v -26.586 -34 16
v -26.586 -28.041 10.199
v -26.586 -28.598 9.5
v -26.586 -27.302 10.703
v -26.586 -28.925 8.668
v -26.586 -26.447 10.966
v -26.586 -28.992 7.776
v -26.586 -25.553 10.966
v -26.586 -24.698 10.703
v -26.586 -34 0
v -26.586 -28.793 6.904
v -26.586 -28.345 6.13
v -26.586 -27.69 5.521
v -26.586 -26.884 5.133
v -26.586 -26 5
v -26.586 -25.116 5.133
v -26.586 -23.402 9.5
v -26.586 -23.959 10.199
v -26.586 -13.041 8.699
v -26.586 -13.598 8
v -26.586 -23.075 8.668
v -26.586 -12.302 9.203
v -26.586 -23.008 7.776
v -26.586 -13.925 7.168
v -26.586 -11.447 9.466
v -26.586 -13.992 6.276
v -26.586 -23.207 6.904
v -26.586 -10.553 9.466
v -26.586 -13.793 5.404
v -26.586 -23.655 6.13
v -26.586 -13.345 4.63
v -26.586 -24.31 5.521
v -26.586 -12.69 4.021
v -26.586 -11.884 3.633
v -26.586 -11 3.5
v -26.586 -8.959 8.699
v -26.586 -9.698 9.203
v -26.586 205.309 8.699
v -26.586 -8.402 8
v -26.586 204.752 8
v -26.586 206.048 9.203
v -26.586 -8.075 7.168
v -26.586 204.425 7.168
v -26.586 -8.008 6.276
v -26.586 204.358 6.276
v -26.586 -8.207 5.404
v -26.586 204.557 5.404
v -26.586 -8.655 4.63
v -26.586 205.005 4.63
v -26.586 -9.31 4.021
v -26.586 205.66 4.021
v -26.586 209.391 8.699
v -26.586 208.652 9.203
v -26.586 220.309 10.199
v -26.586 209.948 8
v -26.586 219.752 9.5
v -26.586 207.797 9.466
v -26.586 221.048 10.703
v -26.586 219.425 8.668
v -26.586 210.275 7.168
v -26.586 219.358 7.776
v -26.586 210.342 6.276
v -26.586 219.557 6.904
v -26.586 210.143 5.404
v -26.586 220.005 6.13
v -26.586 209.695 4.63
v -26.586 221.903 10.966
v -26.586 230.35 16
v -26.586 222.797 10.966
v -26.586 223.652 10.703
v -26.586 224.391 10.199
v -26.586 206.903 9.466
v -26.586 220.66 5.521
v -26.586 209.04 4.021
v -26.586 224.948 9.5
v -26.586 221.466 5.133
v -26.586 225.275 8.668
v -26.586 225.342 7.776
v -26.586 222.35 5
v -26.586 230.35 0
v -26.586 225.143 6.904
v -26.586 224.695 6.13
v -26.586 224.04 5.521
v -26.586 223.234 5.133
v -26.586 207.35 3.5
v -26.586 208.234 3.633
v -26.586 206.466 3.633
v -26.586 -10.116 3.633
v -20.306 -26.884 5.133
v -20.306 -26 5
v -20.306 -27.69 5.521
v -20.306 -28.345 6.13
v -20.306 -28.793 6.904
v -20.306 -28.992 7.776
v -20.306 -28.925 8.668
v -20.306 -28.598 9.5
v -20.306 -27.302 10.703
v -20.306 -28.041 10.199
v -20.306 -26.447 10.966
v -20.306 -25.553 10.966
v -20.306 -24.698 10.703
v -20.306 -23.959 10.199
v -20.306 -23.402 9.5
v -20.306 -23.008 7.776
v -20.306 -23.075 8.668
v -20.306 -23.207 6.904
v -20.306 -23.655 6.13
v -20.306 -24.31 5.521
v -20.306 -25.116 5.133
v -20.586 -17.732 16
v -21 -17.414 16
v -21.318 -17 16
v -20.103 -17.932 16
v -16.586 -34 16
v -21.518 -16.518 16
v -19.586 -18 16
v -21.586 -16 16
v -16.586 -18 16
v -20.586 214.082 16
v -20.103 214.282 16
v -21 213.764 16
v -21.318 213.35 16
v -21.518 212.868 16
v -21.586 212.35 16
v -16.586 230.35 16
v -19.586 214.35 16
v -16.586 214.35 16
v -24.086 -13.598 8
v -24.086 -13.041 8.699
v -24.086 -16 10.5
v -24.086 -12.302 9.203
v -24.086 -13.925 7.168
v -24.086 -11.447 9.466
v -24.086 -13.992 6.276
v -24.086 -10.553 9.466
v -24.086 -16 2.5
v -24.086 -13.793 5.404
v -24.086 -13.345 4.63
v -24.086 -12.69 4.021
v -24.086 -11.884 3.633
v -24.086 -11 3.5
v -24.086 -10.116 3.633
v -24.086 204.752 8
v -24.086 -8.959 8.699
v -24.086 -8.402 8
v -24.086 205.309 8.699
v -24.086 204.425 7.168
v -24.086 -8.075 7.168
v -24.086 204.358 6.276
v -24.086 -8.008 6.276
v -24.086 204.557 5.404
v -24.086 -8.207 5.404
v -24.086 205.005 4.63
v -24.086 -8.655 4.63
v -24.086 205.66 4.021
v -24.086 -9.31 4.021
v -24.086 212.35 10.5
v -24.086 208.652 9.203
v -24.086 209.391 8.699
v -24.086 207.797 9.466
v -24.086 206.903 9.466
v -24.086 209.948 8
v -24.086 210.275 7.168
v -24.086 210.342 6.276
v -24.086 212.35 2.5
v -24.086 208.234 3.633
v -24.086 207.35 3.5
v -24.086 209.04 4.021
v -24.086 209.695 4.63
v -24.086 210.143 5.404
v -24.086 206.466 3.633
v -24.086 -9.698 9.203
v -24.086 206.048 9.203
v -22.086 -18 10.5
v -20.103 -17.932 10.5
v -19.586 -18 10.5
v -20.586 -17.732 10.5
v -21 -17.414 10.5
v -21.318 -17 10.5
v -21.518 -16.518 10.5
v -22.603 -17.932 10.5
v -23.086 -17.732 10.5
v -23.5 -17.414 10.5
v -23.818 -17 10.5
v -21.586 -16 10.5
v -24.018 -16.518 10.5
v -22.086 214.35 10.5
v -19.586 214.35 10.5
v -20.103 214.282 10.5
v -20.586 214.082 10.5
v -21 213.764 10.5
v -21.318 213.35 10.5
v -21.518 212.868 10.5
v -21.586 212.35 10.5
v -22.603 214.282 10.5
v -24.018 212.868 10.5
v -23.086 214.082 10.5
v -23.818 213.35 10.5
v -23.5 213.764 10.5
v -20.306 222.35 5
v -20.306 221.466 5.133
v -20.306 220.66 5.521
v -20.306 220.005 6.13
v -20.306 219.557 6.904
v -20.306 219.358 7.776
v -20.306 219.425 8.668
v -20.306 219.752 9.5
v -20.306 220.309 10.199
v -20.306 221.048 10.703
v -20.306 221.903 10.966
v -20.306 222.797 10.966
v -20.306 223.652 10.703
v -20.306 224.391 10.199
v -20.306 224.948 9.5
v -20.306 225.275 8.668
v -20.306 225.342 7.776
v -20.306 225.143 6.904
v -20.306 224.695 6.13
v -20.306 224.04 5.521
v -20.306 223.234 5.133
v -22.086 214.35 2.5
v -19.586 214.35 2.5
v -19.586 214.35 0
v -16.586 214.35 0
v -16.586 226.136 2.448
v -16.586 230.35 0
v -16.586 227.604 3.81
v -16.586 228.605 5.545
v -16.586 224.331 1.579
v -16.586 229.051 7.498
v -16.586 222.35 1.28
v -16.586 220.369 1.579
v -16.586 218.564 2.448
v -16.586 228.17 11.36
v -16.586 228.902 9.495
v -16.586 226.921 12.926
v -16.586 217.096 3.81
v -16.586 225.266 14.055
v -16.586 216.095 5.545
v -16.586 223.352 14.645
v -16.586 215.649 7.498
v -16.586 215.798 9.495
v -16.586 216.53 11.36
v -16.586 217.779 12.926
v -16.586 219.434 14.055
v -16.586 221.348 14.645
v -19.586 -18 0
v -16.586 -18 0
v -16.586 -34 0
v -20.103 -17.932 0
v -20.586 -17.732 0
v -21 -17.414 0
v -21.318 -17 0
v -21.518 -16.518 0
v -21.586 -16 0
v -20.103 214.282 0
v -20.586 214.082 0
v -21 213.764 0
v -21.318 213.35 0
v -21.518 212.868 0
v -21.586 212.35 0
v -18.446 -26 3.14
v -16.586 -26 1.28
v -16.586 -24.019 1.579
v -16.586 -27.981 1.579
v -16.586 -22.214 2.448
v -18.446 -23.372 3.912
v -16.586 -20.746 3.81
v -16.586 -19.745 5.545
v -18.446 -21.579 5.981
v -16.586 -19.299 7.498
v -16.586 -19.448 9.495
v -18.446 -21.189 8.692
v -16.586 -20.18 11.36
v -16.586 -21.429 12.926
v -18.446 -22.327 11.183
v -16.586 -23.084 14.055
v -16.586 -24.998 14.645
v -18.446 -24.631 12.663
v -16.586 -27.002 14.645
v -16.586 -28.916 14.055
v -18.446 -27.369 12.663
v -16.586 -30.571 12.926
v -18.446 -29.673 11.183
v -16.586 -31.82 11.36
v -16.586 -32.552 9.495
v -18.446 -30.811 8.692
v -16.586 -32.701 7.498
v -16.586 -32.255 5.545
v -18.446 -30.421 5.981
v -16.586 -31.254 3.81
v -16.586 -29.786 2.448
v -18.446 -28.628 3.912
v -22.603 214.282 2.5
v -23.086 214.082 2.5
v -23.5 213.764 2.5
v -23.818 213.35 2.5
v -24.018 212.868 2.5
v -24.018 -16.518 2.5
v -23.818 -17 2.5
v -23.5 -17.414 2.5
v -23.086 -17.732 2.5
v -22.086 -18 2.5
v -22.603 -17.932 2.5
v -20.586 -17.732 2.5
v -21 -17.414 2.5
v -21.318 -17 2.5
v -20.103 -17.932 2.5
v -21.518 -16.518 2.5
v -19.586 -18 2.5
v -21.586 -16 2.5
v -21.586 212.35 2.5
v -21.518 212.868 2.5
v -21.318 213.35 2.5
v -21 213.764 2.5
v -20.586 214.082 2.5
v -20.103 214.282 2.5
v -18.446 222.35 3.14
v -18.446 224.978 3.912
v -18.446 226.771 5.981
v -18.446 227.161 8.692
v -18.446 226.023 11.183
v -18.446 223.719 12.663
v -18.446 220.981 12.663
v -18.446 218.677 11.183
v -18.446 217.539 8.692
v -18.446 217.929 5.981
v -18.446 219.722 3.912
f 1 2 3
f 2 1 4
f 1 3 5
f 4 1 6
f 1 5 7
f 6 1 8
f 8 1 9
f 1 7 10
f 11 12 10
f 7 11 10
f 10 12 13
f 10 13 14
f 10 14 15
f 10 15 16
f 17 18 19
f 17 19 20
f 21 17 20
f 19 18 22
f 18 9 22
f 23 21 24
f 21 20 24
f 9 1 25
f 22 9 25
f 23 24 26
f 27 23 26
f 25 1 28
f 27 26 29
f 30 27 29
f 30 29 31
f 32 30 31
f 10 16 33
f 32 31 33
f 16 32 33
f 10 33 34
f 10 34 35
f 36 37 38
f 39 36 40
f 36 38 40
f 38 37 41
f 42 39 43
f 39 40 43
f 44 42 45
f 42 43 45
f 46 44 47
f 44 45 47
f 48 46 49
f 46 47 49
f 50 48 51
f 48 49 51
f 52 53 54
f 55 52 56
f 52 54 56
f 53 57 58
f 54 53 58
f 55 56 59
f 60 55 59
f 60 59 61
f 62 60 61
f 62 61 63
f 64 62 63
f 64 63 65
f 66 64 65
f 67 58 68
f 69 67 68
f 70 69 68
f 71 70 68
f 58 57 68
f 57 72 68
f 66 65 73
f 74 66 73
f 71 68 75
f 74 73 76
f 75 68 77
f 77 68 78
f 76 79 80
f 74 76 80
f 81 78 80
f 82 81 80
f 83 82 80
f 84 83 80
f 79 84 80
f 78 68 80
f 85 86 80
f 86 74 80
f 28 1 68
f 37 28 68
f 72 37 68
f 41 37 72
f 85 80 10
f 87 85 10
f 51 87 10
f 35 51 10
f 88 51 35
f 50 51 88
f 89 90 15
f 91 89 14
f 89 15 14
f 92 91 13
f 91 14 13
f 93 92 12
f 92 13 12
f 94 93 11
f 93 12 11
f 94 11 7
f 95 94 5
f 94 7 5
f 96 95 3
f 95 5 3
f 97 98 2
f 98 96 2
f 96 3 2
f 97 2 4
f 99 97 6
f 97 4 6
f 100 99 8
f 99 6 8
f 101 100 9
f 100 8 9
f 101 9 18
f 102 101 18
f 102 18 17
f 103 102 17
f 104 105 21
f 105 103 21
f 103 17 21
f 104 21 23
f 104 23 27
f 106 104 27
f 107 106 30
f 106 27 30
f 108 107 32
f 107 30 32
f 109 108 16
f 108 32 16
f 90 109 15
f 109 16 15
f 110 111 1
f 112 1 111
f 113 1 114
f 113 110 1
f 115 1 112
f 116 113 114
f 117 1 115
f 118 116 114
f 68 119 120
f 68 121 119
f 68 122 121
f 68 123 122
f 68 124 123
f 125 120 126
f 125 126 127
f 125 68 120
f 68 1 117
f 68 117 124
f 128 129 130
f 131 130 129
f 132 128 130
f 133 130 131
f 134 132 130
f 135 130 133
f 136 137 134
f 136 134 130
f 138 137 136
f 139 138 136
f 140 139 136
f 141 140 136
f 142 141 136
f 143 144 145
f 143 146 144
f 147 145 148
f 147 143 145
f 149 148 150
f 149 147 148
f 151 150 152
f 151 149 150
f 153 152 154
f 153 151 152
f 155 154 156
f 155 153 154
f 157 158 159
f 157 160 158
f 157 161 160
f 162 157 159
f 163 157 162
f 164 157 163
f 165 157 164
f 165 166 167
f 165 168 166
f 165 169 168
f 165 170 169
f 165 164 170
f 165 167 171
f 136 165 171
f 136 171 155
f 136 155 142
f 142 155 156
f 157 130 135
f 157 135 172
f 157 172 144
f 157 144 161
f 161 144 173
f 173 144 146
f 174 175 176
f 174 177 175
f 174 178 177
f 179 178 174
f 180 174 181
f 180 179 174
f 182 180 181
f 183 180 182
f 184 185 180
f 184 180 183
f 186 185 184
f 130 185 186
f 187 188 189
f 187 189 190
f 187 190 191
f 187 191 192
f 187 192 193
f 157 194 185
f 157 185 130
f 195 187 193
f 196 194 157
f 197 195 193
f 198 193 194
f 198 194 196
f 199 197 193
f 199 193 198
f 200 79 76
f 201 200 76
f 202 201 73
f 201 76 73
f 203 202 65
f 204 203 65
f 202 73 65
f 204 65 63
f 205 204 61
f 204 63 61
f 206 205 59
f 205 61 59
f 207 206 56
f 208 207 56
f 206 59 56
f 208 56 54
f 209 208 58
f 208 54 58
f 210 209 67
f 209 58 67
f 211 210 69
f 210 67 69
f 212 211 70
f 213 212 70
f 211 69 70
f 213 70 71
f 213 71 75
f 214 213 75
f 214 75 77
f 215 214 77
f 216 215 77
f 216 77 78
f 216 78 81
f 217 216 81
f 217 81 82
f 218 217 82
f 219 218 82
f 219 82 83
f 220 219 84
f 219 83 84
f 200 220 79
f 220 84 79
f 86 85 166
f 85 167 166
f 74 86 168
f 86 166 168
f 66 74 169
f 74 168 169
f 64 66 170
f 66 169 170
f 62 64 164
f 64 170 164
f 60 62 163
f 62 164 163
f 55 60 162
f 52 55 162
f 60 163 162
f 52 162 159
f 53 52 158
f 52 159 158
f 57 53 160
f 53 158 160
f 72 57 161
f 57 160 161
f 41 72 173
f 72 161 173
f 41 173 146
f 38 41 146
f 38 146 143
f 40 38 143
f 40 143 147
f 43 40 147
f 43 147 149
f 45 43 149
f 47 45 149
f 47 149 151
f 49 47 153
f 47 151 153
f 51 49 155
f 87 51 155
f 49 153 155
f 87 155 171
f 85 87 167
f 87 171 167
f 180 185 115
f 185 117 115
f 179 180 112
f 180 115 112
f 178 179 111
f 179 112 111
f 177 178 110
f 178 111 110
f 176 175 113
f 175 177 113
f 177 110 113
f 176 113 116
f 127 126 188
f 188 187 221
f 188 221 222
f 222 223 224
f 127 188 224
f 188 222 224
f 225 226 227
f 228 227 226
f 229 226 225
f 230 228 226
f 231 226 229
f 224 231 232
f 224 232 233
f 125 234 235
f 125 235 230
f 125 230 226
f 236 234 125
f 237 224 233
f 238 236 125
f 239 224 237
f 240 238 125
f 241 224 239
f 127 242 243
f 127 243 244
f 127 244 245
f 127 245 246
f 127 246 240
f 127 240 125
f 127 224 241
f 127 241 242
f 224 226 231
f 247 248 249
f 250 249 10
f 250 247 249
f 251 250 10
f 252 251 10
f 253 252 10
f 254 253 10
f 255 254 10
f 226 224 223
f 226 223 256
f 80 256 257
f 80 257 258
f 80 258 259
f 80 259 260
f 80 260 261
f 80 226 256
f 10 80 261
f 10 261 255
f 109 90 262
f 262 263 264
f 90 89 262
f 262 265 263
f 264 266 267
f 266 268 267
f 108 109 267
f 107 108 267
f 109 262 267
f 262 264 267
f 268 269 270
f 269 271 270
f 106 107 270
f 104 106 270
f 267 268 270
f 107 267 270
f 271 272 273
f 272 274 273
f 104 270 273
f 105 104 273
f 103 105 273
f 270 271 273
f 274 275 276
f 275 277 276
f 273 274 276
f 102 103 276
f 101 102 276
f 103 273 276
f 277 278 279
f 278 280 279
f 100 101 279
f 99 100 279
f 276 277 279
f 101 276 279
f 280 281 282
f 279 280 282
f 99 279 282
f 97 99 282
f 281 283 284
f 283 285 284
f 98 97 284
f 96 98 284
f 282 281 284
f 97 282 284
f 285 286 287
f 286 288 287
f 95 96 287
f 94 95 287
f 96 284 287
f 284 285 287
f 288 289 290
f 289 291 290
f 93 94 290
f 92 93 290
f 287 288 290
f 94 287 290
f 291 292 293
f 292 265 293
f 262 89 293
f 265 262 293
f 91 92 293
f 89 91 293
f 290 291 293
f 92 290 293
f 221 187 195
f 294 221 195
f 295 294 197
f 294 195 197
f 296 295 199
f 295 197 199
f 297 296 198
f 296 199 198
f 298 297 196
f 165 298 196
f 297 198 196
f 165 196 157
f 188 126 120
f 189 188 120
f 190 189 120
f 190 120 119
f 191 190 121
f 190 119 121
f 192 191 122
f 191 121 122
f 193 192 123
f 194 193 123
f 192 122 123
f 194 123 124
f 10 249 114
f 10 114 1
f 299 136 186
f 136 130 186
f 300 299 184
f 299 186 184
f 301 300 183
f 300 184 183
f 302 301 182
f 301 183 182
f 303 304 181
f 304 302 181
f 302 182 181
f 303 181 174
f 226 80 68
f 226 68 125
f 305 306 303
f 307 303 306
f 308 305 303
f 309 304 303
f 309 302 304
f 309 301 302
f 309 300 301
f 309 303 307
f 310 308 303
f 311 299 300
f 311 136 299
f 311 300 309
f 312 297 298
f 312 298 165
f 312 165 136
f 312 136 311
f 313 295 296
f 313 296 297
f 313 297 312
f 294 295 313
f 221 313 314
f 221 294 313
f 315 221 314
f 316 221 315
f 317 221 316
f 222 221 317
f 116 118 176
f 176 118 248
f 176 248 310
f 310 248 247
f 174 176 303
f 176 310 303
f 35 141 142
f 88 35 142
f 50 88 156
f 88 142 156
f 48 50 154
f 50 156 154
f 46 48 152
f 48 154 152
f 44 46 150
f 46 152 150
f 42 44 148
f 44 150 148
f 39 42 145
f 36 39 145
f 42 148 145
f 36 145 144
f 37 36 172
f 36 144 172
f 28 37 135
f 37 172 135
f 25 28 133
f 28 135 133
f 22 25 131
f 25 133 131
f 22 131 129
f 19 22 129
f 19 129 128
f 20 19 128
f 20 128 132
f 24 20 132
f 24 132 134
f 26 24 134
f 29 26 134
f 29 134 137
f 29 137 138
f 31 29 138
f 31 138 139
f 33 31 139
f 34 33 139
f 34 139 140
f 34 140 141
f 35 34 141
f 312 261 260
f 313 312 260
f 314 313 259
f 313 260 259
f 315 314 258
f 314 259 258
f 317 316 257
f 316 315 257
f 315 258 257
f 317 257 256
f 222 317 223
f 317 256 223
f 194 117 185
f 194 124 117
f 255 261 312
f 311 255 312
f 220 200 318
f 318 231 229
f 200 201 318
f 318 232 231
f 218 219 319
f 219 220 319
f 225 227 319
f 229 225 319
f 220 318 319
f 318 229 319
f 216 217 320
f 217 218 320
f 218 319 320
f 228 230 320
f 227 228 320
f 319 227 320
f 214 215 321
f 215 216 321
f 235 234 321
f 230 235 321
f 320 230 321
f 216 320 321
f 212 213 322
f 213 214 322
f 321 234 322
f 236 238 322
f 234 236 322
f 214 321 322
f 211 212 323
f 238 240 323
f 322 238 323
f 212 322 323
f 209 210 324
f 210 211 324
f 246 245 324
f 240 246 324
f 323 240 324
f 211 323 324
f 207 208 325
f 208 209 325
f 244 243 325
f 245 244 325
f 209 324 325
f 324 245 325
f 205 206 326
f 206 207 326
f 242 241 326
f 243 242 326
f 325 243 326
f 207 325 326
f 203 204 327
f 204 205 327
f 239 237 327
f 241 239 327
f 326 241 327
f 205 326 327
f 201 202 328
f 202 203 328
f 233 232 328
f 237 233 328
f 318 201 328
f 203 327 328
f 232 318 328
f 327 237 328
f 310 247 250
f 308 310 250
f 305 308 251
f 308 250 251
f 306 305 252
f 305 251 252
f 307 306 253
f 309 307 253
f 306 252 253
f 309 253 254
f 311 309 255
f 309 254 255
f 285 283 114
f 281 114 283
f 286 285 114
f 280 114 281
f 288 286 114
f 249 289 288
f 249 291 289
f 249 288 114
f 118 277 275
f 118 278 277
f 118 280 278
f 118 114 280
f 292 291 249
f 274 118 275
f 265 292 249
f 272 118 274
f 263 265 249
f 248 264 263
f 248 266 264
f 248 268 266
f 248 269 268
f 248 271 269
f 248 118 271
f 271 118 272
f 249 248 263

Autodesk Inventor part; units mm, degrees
ref_plane "YZ Plane" through (0, 0, 0) normal (1, 0, 0) x (0, 1, 0)
sketch "Sketch2" plane through (0, 0, 0) normal (0, 0, 1) x (1, 0, 0)
  line L0 (-32.0857, 0) -> (0, 0)
  line L1 (0, 0) -> (0, 19.635)
  line L2 (0, 19.635) -> (-32.0857, 19.635)
  spline S0 degree 3 poles (-32.0857, 19.635) (-32.0786, 19.6019) (-32.0585, 19.4984) (-32.0378, 19.3226) (-32.0222, 19.1083) (-32.0293, 18.8935) (-32.0484, 18.6795) (-32.102, 18.3981) (-32.1765, 18.0482) (-32.2416, 17.6965) (-32.2997, 17.416) (-32.364, 17.211) (-32.4396, 17.0099) (-32.536, 16.8179) (-32.6409, 16.6304) (-32.7641, 16.4543) (-32.8983, 16.2866) (-33.043, 16.1278) (-33.201, 15.9822) (-33.3669, 15.8459) (-33.5414, 15.7205) (-33.7857, 15.5713) (-34.1055, 15.4094) (-34.509, 15.2608) (-34.9249, 15.1525) (-35.3479, 15.078) (-35.7753, 15.0341) (-36.2047, 15.0215) (-36.6341, 15.0313) (-37.0623, 15.0646) (-37.3462, 15.1014) (-37.4881, 15.1198) knots -0.847201 -0.847201 -0.847201 -0.847201 -0.83705 -0.815587 -0.794126 -0.772659 -0.751201 -0.729734 -0.686802 -0.64387 -0.622403 -0.600945 -0.579478 -0.558017 -0.536554 -0.515088 -0.49363 -0.472163 -0.450698 -0.429238 -0.407769 -0.386302 -0.343394 -0.300476 -0.257562 -0.214646 -0.17172 -0.12879 -0.085861 -0.04293 0 0 0 0
  spline S1 degree 3 poles (-37.4881, 15.1198) (-37.594, 15.1249) (-37.8057, 15.1352) (-38.2295, 15.119) (-38.7575, 15.0717) (-39.3865, 14.9771) (-40.0103, 14.8535) (-40.6285, 14.7043) (-41.2408, 14.5326) (-41.847, 14.3405) (-42.4469, 14.1297) (-43.0405, 13.9015) (-43.6276, 13.6572) (-44.2081, 13.3977) (-44.782, 13.1239) (-45.3493, 12.8367) (-45.9097, 12.5363) (-46.4639, 12.2246) (-46.8275, 12.0066) (-47.0092, 11.8976) knots -1.017256 -1.017256 -1.017256 -1.017256 -0.985476 -0.953687 -0.890117 -0.826542 -0.762964 -0.699386 -0.635807 -0.572227 -0.508647 -0.445066 -0.381486 -0.317905 -0.254324 -0.190743 -0.127162 -0.063581 0 0 0 0
  arc A0 (-47.0092, 11.8976) -> (-47.0092, 7.7374) centre (9.2023, 9.8175) ccw
  spline S2 degree 3 poles (-47.0092, 7.7374) (-46.8275, 7.6284) (-46.4639, 7.4104) (-45.9097, 7.0987) (-45.3493, 6.7983) (-44.782, 6.5111) (-44.2081, 6.2373) (-43.6276, 5.9778) (-43.0405, 5.7335) (-42.4469, 5.5053) (-41.847, 5.2945) (-41.2408, 5.1024) (-40.6285, 4.9307) (-40.0103, 4.7815) (-39.3865, 4.6579) (-38.7575, 4.5633) (-38.2295, 4.516) (-37.8057, 4.4998) (-37.594, 4.5101) (-37.4881, 4.5152) knots -1.017256 -1.017256 -1.017256 -1.017256 -0.953675 -0.890094 -0.826513 -0.762932 -0.699351 -0.63577 -0.572189 -0.508609 -0.445029 -0.381449 -0.31787 -0.254291 -0.190714 -0.127139 -0.063568 -0.03178 0 0 0 0
  spline S3 degree 3 poles (-37.4881, 4.5152) (-37.3462, 4.5336) (-37.0623, 4.5704) (-36.6341, 4.6037) (-36.2047, 4.6135) (-35.7753, 4.6009) (-35.3479, 4.557) (-34.9249, 4.4825) (-34.509, 4.3742) (-34.1055, 4.2256) (-33.7857, 4.0637) (-33.5414, 3.9145) (-33.3669, 3.7891) (-33.201, 3.6528) (-33.043, 3.5072) (-32.8983, 3.3484) (-32.7641, 3.1807) (-32.6409, 3.0046) (-32.536, 2.8171) (-32.4396, 2.6251) (-32.364, 2.424) (-32.2997, 2.219) (-32.2416, 1.9385) (-32.1765, 1.5868) (-32.102, 1.2369) (-32.0484, 0.9555) (-32.0293, 0.7415) (-32.0222, 0.5267) (-32.0378, 0.3124) (-32.0585, 0.1366) (-32.0786, 0.0331) (-32.0857, 0) knots -1.373604 -1.373604 -1.373604 -1.373604 -1.330674 -1.287743 -1.244814 -1.201884 -1.158958 -1.116042 -1.073128 -1.03021 -0.987302 -0.965835 -0.944366 -0.922906 -0.901441 -0.879974 -0.858516 -0.83705 -0.815587 -0.794126 -0.772659 -0.751201 -0.729734 -0.686802 -0.64387 -0.622403 -0.600945 -0.579478 -0.558017 -0.536554 -0.526403 -0.526403 -0.526403 -0.526403
extrude "Extrusion1" add sketch "Sketch2" along normal blind 16
pattern_linear "Rectangular Pattern1" count 10 spacing 19.635 along (0, 1, 0) of "Extrusion1"
sketch "Sketch5" plane through (-32.0857, 0, 0) normal (0, -1, 0) x (1, 0, 0)
  line L0 (32.0857, 0) -> (32.0857, 16) projected
  line L1 (0, 16) -> (32.0857, 16) projected
  line L2 (0, 0) -> (32.0857, 0) projected
  line L3 (0, 0) -> (0, 16) projected
  line L4 (0, 16) -> (8, 16)
  line L5 (8, 16) -> (8, 0) construction
  line L6 (8, 0) -> (0, 0)
  line L7 (0, 0) -> (0, 16)
  line L8 (8, 16) -> (10.5, 16)
  line L9 (10.5, 16) -> (10.5, 10.5)
  line L10 (10.5, 10.5) -> (8, 10.5)
  line L11 (8, 10.5) -> (8, 16) construction
  line L12 (8, 2.5) -> (10.5, 2.5)
  line L13 (10.5, 2.5) -> (10.5, 0)
  line L14 (10.5, 0) -> (8, 0)
  line L15 (8, 0) -> (8, 2.5) construction
  line L16 (8, 9.5) -> (37, 9.5) construction
  line L17 (37, 9.5) -> (37, 3.5) construction
  line L18 (37, 3.5) -> (8, 3.5) construction
  line L19 (8, 3.5) -> (8, 9.5) construction
  line L20 (8, 10.5) -> (8, 2.5)
  line L21 (34.5, 15.5) -> (10.5, 15.5) construction
  line L22 (10.5, 15.5) -> (10.5, 0.5) construction
  line L23 (10.5, 0.5) -> (34.5, 0.5) construction
  line L24 (34.5, 0.5) -> (34.5, 15.5) construction
  line L25 (41.5759, 16) -> (41.5759, 15.5) construction
  line L26 (41.5759, 0.5) -> (41.5759, 0) construction
  line L27 (25.6, 16.05) -> (19.4, 16.05) construction
  line L28 (19.4, -0.05) -> (25.6, -0.05) construction
  line L29 (25.6, -0.05) -> (25.6, 0.5) construction
  line L30 (25.6, 15.5) -> (25.6, 16.05) construction
  line L31 (19.4, 16.05) -> (19.4, 15.5) construction
  line L32 (19.4, 0.5) -> (19.4, -0.05) construction
  line L33 (25.6, 0.5) -> (25.6, 15.5) construction
  line L34 (19.4, 15.5) -> (19.4, 0.5) construction
  point P0 (9.25, 10.5)
  point P1 (9.25, 2.5)
  point P2 (8, 6.5)
  point P3 (8, 6.5)
  point P4 (22.5, 15.5)
  point P5 (22.5, 9.5)
  point P6 (22.5, -0.05)
  dimension "d15" = 8
  dimension "d16" = 8
  dimension "d18" = 6
  dimension "d19" = 29
  dimension "d20" = 24
  dimension "d21" = 6
  dimension "d22" = 3
  dimension "d23" = 2.5
  dimension "d24" = 2.5
  dimension "d30" = 5.5
  dimension "d31" = 2.5
  dimension "d64" = 6.2
  dimension "d65" = 16.1
extrude "Extrusion3" cut sketch "Sketch5" against normal through all contours L2 L13 L12 L20 L10 L9 L1 L0
sketch "Measurements" plane through (0, 0, 0) normal (0, 0, -1) x (-1, 0, 0)
  line L0 (41.7977, 19.635) -> (70.5831, 19.635) construction
  line L1 (141.7977, 176.7146) -> (141.7977, 118.484) construction
  line L2 (21.5857, 196.35) -> (21.5857, 0) projected
  line L3 (32.0857, 0) -> (21.5857, 0) projected
  circle A0 centre (91.7977, 19.635) radius 50 construction
  line L4 (41.7977, -40.4843) -> (41.7977, 79.7543) construction
  line L5 (41.7977, 19.635) -> (141.7977, 19.635) construction
  line L6 (141.7977, 19.635) -> (141.7977, 176.7146) construction
  arc A1 (41.7977, 19.635) -> (141.7977, 176.7146) centre (-31.5724, 176.7146) ccw construction
  circle A2 centre (91.7977, 176.7146) radius 50 construction
  line L7 (-14.9143, 139.9646) -> (32.0857, 139.9646) construction
  line L8 (32.0857, 139.9646) -> (32.0857, 213.4646) construction
  line L9 (32.0857, 213.4646) -> (-14.9143, 213.4646) construction
  line L10 (-14.9143, 213.4646) -> (-14.9143, 139.9646) construction
  circle A3 centre (91.7977, 176.7146) radius 5 construction
  line L11 (32.0857, 139.9646) -> (96.4406, 164.572) construction
  arc A4 (96.4406, 164.572) -> (96.4406, 188.8572) centre (91.7977, 176.7146) ccw construction
  line L12 (96.4406, 188.8572) -> (32.0857, 213.4646) construction
  line L13 (-14.9143, -17.115) -> (32.0857, -17.115) construction
  line L14 (32.0857, -17.115) -> (32.0857, 56.385) construction
  line L15 (32.0857, 56.385) -> (-14.9143, 56.385) construction
  line L16 (-14.9143, 56.385) -> (-14.9143, -17.115) construction
  circle A5 centre (91.7977, 19.635) radius 5 construction
  line L17 (32.0857, -17.115) -> (96.4406, 7.4924) construction
  arc A6 (96.4406, 7.4924) -> (96.4406, 31.7776) centre (91.7977, 19.635) ccw construction
  line L18 (96.4406, 31.7776) -> (32.0857, 56.385) construction
  line L19 (96.7977, 176.7146) -> (96.7977, 157.197) construction
  line L20 (96.7977, 19.635) -> (96.7977, 0.1424) construction
  circle A7 centre (9.5857, 201.4646) radius 14.5 construction
  line L21 (-14.9143, 176.7146) -> (-21.6792, 176.7146)
  circle A8 centre (9.5857, 151.9646) radius 14.5 construction
  point P0 (0, 0)
  point P1 (32.0857, 176.7146)
  point P2 (104.7977, 176.7146)
  point P3 (104.7977, 19.635)
  point P4 (32.0857, 19.635)
  dimension "d43" = 10
  dimension "d32" = 100
  dimension "d33" = 157.0796
  dimension "d34" = 59.712
  dimension "d36" = 73.5
  dimension "d37" = 47
  dimension "d38" = 73.5
  dimension "d39" = 47
  dimension "d41" = 8
  dimension "d44" = 17.115
  dimension "d66" = 29
  dimension "d67" = 12
  dimension "d68" = 24.5
ref_plane "Midplane" through (-32.0857, 98.175, 0) normal (0, -1, 0) x (1, 0, 0)
sketch "Sketch10" plane through (-32.0857, 196.35, 16) normal (0, 1, 0) x (1, 0, 0)
  line L0 (0, 16) -> (0, 0) projected
  line L1 (10.5, 16) -> (0, 16) projected
  line L2 (0, 16) -> (10.5, 16)
  line L3 (10.5, 13.5) -> (10.5, 16)
  line L4 (10.5, 13.5) -> (8, 13.5) projected
  line L5 (8, 13.5) -> (10.5, 13.5)
  line L6 (8, 13.5) -> (8, 5.5) projected
  line L7 (8, 5.5) -> (8, 13.5)
  line L8 (8, 5.5) -> (10.5, 5.5) projected
  line L9 (10.5, 5.5) -> (8, 5.5)
  line L10 (10.5, 5.5) -> (10.5, 0)
  line L11 (10.5, 0) -> (0, 0)
  line L12 (0, 0) -> (0, 16)
  point P0 (32.0857, 16)
extrude "Extra" add sketch "Sketch10" along normal blind 18
sketch "Sketch11" plane through (-32.0857, 214.35, 16) normal (0, 1, 0) x (1, 0, 0)
  line L0 (0, 16) -> (15.5, 16)
  line L1 (15.5, 16) -> (15.5, 0)
  line L2 (15.5, 0) -> (0, 0)
  line L3 (0, 0) -> (0, 16)
  line L4 (0, 0) -> (10.5, 0) projected
  line L5 (10.5, 16) -> (0, 16) projected
  line L6 (10.5, 0) -> (10.5, 5.5) projected
  line L7 (0, 16) -> (0, 0) projected
  point P0 (32.0857, 16)
  dimension "d63" = 5
extrude "Bracket" add sketch "Sketch11" along normal blind 16
sketch "Sketch13" plane through (-16.5857, 214.35, 16) normal (1, 0, 0) x (0, 0, -1)
  circle A0 centre (8, 8) radius 5.865
  line L0 (16, 0) -> (16, 16) projected
  line L1 (0, 16) -> (16, 16) projected
  point P0 (16, -214.35)
  point P1 (16, 8)
  point P2 (8, 16)
  dimension "d69" = 11.73
hole "Hole1" at (-16.5857, 222.35, 8) direction (-1, 0, 0) diameter 6 end through all countersink diameter 13.44 countersink angle 90
fillet "Fillet2" radius 2 3 edges at (-21.5857, 214.35, 1.25) (-24.0857, 214.35, 6.5) (-21.5857, 214.35, 13.25)
mirror "Mirror3" about plane through (-32.0857, 98.175, 0) normal (0, -1, 0) of "Fillet2", "Hole1", "Bracket", "Extra"
ref_plane "Work Plane3" through (-26.5857, 212.35, 16) normal (1, 0, 0) x (0, 0, -1)
sketch "Sketch14" plane through (-26.5857, 212.35, 16) normal (1, 0, 0) x (0, 0, -1)
  line L0 (26.8583, 24.8606) -> (-9.9213, 24.8606)
  line L1 (-9.9213, 24.8606) -> (-9.9213, -261.2458)
  line L2 (-9.9213, -261.2458) -> (26.8583, -261.2458)
  line L3 (26.8583, -261.2458) -> (26.8583, 24.8606)
  point P0 (16, -212.35)
extrude "Extrusion7" cut sketch "Sketch14" against normal through all
sketch "Sketch15" plane through (-24.0857, 212.35, 10.5) normal (1, 0, 0) x (0, 0, -1)
  circle A0 centre (4, -223.35) radius 3
  line L0 (-47.7239, -114.175) -> (-79.2168, -114.175)
  line L1 (-32.3539, 18) -> (-32.3539, -246.35) construction
  circle A1 centre (4, -5) radius 3
  line L2 (8, 2) -> (0, 2) projected
  line L3 (8, -228.35) -> (0, -228.35) projected
  line L4 (-5.5, -246.35) -> (10.5, -246.35) projected
  point P0 (0, 18)
  point P1 (-32.3539, -114.175)
  point P2 (4, 2)
  point P3 (-5.5, 18)
  dimension "d82" = 6
  dimension "d83" = 5
  dimension "d86" = 23
  dimension "d87" = 9.5
extrude "Extrusion8" cut sketch "Sketch15" against normal through all
properties part number "rack6mm-v2-top"
